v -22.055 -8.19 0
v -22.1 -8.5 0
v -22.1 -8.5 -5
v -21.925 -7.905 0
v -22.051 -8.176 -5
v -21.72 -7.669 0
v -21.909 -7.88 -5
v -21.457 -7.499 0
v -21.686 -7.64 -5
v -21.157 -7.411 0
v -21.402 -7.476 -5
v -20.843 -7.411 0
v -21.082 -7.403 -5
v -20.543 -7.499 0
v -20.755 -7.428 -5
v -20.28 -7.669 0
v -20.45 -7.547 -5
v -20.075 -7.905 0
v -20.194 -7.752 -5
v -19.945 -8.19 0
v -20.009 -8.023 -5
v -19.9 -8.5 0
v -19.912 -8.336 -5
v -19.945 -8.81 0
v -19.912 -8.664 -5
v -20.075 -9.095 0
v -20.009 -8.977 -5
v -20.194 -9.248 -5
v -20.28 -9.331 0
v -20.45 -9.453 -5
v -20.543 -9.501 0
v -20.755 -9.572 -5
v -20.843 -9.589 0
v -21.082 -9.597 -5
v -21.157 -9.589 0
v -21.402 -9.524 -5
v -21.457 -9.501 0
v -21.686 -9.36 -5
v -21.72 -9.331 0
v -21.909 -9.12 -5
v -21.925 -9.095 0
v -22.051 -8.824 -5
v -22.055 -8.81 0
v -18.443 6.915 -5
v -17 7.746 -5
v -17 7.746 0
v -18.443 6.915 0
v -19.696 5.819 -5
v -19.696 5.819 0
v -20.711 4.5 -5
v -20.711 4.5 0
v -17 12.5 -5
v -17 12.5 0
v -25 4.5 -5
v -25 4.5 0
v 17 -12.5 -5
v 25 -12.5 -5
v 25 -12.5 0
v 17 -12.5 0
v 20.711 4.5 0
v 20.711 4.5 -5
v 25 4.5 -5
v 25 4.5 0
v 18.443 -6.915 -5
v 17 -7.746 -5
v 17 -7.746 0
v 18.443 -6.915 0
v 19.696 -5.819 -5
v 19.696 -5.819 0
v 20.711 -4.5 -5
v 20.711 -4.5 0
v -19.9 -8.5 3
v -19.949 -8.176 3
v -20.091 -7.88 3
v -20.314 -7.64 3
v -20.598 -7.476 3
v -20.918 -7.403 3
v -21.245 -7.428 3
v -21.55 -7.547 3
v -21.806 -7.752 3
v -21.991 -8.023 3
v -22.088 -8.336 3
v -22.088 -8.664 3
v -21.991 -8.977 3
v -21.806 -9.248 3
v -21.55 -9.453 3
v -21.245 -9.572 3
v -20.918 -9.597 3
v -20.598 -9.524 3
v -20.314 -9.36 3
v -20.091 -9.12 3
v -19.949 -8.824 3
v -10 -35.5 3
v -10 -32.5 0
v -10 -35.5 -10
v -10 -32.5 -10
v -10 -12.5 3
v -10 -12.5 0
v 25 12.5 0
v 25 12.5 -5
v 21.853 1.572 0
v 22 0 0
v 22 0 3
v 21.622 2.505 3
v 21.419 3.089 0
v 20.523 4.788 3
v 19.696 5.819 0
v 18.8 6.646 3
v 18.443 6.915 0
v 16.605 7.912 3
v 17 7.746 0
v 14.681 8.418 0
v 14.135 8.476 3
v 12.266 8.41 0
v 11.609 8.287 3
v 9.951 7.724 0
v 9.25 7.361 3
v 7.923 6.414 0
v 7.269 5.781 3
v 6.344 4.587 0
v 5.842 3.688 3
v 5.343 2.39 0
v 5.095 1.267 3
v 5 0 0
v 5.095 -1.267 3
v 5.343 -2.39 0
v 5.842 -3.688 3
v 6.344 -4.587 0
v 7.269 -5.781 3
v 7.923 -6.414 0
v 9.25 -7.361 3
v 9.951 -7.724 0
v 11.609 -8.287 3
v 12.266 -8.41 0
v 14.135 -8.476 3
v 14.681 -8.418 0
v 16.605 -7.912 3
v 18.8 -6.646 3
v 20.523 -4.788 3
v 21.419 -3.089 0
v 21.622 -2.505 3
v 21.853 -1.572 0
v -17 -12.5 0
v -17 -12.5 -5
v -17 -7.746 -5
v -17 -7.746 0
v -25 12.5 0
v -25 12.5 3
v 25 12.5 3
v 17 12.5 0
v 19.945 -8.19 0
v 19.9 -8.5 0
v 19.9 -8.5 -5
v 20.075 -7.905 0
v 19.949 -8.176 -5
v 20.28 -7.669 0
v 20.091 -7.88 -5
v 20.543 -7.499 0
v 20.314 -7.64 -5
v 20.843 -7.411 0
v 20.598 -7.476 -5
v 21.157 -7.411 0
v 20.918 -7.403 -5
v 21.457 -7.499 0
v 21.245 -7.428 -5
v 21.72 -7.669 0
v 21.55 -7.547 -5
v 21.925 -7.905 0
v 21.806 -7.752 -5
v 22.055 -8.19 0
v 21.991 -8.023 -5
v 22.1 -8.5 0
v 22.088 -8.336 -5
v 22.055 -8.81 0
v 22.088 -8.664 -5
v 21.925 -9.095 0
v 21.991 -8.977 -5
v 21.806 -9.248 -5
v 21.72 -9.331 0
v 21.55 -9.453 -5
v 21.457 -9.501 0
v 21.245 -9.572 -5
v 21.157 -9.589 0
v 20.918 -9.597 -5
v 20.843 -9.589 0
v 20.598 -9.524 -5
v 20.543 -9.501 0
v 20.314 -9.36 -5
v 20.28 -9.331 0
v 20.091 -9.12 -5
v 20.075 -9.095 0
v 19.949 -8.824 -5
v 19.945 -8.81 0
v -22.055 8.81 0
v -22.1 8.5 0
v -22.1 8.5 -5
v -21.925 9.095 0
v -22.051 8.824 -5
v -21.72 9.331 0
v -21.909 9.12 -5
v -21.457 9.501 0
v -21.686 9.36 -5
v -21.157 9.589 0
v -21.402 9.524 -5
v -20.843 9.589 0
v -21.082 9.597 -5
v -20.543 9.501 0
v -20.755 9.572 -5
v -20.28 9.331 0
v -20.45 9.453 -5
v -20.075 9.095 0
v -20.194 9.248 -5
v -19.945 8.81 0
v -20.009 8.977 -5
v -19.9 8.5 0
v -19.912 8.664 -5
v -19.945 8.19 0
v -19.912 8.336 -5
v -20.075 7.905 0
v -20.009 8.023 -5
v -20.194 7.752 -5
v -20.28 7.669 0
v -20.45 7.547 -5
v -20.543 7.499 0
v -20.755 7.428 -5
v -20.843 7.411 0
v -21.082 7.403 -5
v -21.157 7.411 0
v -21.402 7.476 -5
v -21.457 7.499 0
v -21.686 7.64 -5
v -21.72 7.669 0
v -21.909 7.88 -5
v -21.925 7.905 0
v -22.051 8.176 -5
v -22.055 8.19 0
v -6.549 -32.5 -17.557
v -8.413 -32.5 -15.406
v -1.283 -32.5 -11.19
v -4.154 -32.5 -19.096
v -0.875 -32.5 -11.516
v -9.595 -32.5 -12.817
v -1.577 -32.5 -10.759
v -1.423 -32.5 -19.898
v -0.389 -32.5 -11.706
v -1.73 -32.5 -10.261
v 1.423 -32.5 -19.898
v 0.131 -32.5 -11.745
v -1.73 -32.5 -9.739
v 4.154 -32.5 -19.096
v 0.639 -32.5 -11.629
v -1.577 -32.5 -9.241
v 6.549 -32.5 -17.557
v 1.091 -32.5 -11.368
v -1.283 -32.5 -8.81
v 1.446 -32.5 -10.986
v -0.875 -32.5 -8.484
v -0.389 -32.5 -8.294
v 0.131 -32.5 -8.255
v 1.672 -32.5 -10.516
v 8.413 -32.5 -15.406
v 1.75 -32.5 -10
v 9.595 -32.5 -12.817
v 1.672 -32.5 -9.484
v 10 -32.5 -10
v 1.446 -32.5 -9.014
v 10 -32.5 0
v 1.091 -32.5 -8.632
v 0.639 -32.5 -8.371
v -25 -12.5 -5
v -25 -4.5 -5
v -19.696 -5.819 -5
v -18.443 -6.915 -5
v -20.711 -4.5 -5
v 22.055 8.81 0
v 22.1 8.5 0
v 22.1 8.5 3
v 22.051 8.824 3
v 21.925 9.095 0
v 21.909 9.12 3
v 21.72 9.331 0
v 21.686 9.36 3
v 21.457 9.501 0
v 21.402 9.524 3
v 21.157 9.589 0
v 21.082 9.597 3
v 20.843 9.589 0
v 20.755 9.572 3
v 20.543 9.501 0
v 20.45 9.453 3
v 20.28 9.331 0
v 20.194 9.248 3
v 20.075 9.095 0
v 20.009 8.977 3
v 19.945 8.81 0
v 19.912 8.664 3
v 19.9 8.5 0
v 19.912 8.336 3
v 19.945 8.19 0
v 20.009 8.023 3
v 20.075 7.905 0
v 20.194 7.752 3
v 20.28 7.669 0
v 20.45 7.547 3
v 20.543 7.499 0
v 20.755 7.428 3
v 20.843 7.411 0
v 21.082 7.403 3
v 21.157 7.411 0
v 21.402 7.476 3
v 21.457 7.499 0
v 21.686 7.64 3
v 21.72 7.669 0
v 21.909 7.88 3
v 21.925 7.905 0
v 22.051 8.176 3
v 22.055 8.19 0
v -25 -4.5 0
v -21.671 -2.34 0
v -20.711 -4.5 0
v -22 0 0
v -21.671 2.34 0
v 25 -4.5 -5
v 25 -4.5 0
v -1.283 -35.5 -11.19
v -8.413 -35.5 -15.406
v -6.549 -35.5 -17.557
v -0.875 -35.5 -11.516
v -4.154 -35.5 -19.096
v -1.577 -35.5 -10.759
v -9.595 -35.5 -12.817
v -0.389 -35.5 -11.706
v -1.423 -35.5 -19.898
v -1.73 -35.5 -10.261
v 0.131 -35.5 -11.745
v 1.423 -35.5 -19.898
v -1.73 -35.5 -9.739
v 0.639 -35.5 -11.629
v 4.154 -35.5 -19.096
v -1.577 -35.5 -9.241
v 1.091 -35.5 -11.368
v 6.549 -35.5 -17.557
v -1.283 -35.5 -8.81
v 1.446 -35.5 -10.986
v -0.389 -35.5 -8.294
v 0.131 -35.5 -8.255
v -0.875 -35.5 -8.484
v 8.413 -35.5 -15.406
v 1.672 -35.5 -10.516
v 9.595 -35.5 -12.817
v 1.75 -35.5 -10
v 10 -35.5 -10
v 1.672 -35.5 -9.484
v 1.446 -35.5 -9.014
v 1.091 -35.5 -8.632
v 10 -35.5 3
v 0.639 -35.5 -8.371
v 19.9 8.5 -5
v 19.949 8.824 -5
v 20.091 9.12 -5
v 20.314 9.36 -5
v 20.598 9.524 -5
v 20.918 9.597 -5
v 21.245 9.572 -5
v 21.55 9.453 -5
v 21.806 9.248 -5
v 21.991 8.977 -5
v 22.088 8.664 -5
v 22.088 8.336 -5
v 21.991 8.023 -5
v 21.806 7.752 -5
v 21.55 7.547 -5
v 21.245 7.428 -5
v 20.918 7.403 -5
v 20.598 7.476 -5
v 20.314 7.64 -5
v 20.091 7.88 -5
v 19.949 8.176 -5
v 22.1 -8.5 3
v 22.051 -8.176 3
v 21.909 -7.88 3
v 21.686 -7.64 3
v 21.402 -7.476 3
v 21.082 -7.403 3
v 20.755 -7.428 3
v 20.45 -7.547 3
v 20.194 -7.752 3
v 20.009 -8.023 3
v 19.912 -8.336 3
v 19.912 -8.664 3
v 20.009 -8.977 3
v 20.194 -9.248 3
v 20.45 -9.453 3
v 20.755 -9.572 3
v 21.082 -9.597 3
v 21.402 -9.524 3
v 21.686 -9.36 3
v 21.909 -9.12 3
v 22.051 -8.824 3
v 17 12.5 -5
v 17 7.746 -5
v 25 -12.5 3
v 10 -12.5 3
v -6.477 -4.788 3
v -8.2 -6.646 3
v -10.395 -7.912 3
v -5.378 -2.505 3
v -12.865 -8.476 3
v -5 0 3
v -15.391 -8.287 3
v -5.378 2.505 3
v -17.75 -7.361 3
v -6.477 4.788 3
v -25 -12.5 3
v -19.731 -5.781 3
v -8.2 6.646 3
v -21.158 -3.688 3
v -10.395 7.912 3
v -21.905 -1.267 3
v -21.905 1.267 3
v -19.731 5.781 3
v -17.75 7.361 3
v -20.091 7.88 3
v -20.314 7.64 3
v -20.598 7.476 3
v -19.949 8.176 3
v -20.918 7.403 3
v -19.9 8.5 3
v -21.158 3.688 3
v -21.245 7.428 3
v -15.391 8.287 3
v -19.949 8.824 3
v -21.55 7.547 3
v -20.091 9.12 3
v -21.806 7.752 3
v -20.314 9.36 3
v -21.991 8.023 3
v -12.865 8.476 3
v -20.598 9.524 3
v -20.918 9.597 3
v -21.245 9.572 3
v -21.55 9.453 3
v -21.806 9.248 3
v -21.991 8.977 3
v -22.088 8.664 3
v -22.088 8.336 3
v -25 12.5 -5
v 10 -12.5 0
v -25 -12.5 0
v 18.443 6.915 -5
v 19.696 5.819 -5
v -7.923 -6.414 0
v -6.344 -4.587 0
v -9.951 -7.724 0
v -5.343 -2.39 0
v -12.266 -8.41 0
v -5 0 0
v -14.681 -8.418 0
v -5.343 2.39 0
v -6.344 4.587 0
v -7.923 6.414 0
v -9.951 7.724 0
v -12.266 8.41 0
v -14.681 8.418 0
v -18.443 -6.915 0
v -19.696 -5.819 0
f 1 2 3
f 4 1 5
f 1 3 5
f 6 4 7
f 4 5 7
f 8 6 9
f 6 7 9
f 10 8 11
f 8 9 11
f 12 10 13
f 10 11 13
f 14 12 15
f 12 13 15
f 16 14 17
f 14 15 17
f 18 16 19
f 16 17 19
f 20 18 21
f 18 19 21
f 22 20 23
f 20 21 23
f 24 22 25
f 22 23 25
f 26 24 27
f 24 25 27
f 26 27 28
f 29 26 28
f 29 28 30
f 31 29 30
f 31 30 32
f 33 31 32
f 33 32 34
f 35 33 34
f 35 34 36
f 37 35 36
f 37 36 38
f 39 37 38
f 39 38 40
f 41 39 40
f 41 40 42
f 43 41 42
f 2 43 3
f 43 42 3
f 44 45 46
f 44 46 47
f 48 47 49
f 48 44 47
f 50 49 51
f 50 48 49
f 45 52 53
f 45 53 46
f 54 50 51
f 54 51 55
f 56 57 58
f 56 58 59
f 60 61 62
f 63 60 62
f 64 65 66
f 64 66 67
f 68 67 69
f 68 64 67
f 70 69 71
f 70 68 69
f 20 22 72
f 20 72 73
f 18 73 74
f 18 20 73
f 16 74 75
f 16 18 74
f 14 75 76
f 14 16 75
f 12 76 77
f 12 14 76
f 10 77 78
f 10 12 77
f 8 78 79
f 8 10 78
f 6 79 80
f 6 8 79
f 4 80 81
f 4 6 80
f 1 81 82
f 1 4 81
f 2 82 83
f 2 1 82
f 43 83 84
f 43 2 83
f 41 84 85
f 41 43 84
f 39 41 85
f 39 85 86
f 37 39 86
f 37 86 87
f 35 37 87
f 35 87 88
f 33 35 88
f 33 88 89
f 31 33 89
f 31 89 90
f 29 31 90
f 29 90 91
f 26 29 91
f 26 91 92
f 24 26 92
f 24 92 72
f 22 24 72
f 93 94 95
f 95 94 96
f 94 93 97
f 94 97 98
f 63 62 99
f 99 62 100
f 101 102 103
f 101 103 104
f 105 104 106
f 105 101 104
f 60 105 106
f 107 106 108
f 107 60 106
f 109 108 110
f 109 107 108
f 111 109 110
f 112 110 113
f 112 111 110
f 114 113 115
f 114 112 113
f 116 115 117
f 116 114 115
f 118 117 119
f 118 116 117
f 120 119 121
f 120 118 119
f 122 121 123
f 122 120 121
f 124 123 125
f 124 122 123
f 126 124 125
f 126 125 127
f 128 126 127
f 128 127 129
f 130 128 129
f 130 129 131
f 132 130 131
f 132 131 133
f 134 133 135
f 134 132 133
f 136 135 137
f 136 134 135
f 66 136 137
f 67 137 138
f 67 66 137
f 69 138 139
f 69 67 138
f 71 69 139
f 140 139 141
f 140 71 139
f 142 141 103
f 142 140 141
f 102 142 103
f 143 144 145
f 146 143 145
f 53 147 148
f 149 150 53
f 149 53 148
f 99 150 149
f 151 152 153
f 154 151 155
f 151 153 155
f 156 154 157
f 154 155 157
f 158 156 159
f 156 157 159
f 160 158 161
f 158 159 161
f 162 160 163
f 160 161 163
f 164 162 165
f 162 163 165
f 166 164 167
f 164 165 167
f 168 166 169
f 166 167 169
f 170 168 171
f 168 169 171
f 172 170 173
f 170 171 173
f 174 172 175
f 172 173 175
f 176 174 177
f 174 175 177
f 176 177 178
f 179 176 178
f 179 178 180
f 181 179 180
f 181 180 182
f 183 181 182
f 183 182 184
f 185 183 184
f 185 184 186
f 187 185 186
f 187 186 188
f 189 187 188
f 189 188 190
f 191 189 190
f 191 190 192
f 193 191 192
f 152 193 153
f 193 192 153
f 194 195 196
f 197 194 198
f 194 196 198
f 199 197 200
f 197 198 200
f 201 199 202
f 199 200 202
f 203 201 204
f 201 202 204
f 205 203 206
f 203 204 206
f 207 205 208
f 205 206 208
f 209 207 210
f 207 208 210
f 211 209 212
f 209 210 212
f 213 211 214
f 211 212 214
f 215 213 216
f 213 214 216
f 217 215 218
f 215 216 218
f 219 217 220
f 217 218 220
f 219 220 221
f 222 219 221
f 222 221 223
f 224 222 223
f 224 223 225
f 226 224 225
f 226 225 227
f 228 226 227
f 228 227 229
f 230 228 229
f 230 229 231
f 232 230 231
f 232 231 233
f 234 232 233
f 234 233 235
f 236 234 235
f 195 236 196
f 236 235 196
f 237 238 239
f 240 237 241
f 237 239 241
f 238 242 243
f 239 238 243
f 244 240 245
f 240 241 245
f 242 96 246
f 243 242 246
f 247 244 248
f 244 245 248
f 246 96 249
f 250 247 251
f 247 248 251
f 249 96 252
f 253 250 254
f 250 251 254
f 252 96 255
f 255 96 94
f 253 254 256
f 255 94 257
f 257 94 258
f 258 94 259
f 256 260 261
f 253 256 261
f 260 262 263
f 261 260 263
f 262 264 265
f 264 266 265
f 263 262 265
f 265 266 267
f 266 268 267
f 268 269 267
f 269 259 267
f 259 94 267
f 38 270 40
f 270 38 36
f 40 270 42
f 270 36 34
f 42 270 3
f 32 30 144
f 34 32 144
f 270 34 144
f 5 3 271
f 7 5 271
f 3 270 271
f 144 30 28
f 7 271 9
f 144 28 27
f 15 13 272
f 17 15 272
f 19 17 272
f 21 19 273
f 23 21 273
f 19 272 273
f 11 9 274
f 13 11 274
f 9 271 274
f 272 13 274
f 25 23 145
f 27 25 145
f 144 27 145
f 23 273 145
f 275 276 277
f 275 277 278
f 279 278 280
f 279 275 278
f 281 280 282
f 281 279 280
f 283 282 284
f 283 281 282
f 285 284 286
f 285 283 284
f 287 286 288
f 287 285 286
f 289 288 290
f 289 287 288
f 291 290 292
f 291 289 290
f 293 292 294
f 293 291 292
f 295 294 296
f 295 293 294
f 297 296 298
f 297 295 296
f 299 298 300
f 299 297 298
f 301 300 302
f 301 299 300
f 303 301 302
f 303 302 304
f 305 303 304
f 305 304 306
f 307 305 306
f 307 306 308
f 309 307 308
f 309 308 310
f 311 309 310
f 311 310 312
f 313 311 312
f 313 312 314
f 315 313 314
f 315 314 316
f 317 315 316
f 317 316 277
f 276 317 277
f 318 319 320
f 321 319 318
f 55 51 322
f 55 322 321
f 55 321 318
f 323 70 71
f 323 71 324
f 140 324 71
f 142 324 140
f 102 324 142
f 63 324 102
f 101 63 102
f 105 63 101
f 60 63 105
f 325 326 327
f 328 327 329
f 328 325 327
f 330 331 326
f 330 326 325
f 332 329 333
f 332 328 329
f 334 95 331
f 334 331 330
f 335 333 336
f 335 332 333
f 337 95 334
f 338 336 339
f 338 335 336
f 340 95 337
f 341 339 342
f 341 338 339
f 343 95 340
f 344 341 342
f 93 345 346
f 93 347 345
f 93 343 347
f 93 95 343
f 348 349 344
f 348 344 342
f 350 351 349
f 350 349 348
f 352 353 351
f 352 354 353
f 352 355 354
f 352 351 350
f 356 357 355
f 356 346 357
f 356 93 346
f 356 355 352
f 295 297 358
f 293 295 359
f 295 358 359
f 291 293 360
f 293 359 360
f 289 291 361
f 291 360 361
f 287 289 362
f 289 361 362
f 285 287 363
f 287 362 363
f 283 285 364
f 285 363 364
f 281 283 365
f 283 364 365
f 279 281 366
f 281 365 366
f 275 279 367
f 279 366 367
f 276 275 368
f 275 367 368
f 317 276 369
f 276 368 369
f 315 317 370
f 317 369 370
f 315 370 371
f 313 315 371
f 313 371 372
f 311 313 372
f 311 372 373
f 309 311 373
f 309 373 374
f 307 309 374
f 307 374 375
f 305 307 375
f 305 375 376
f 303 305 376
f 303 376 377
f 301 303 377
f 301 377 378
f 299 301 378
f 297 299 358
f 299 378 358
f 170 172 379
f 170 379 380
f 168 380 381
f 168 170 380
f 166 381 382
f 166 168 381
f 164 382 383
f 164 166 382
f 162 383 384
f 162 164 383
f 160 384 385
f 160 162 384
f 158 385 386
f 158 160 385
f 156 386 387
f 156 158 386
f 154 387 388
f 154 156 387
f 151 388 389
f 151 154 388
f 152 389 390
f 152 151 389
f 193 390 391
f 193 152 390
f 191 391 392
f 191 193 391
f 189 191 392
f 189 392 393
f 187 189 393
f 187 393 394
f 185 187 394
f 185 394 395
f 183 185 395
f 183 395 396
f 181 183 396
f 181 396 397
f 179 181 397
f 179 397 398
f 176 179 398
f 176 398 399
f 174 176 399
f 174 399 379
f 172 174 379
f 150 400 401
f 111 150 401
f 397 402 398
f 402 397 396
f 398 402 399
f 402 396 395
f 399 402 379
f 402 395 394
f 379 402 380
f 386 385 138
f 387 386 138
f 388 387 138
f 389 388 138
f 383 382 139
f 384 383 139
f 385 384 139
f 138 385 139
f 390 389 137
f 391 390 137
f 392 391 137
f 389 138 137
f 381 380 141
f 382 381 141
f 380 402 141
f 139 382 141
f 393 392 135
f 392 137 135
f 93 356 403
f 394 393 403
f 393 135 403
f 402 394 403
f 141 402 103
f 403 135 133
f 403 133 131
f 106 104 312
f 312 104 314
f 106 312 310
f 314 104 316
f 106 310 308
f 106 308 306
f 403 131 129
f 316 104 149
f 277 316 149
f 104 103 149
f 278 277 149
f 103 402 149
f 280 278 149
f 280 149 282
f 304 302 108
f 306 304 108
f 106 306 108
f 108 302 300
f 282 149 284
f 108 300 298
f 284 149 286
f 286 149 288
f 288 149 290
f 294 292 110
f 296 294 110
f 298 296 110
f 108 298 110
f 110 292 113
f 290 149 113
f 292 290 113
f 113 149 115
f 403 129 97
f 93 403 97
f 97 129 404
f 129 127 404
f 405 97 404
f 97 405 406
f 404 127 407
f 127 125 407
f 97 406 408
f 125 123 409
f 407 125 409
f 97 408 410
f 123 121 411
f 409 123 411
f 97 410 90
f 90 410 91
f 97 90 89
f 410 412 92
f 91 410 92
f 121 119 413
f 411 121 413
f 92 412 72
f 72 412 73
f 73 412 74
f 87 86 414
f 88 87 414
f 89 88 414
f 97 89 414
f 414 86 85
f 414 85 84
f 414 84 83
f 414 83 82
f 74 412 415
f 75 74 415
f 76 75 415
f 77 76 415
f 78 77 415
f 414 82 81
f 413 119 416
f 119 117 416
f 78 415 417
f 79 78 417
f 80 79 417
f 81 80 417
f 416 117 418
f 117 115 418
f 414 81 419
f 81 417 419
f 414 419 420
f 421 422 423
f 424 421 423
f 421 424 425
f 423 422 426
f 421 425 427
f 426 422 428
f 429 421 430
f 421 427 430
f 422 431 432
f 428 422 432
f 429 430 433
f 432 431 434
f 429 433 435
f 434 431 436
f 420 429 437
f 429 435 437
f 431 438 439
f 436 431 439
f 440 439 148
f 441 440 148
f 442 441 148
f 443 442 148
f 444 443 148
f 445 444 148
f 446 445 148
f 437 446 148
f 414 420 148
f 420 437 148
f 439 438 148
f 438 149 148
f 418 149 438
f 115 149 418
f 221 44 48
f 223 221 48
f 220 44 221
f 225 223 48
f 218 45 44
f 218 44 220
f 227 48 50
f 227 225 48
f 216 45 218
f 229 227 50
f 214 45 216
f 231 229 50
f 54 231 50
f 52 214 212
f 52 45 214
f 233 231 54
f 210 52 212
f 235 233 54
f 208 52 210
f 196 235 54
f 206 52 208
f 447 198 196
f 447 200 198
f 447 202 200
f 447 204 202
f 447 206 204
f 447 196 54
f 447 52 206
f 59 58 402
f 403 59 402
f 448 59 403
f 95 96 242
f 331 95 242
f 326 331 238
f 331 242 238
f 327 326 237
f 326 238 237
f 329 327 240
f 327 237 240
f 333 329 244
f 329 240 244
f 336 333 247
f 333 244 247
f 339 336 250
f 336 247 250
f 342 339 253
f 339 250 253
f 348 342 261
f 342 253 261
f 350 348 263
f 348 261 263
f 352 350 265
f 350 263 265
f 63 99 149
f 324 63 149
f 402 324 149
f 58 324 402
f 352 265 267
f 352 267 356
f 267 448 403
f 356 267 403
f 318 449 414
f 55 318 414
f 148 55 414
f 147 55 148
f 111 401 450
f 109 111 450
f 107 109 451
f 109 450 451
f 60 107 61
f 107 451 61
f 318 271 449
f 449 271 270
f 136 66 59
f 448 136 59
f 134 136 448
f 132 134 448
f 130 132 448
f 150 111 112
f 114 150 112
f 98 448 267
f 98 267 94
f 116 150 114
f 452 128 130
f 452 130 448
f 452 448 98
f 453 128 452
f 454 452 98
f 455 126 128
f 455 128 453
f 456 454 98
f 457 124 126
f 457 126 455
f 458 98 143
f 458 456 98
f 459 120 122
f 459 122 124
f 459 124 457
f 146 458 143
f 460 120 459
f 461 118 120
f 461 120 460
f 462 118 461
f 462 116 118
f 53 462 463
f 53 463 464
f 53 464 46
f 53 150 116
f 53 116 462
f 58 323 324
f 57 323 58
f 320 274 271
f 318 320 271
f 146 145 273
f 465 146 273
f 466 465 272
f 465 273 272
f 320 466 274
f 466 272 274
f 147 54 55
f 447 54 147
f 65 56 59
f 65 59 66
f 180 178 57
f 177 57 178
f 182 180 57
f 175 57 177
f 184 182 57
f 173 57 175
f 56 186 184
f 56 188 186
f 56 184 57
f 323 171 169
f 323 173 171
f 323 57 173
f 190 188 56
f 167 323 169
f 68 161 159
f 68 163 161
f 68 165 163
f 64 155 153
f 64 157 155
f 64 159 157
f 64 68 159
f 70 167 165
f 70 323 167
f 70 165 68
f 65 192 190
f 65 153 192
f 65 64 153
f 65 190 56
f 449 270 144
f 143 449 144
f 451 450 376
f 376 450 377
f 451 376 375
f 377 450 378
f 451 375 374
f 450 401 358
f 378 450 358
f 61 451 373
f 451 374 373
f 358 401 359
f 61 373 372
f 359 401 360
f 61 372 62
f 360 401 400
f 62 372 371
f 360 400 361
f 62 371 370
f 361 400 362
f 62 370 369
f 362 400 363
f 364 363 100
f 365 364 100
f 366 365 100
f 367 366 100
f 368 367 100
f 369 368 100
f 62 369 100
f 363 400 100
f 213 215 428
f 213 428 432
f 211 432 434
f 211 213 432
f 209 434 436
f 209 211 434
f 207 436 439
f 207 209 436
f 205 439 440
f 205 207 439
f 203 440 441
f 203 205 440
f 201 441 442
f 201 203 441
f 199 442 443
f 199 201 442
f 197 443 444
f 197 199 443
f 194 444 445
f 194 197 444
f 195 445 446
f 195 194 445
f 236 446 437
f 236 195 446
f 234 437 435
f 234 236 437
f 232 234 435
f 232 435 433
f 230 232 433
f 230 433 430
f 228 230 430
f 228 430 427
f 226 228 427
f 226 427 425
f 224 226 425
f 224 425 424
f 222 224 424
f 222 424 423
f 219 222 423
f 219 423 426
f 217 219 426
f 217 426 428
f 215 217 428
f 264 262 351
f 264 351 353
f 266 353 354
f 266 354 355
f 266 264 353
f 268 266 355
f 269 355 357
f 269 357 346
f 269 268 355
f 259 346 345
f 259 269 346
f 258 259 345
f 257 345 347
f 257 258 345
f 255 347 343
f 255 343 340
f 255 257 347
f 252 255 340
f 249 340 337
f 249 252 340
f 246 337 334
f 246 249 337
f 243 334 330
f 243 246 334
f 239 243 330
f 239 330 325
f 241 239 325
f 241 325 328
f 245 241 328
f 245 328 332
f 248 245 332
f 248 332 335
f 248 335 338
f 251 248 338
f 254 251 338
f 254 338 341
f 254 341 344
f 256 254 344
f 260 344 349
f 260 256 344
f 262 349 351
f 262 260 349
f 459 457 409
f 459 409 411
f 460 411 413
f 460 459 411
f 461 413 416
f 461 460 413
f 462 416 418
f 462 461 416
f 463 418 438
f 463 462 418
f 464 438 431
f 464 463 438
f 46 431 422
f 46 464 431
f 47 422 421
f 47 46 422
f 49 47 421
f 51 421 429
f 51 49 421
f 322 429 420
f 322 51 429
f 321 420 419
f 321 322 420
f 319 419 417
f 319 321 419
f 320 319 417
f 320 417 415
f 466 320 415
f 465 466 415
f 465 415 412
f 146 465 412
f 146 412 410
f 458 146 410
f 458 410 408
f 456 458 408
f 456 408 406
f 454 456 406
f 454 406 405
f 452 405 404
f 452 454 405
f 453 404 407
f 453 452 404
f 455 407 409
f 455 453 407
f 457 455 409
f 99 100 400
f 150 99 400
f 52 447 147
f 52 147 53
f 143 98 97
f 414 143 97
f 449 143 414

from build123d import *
from build123d.topology import SkipClean

# Parameters (mm, degrees)
SKETCH_1_R      = 8.5
SKETCH_1_R_2    = 1.1
EXTRUDE_1_DEPTH = 3
SKETCH_2_R      = 1.75
EXTRUDE_2_DEPTH = 3
EXTRUDE_START   = 5
SKETCH_5_R      = 1.1
EXTRUDE_3_DEPTH = 5


with BuildPart() as part:
    # 草图1 → 凸台-拉伸1 (new body)
    with BuildSketch(Plane.XY):
        Polygon((-25, 12.5), (25, 12.5), (25, -12.5), (10, -12.5), (10, -32.5), (-10, -32.5), (-10, -12.5), (-25, -12.5), align=None)
        with Locations((-13.5, 0)):
            Circle(SKETCH_1_R, mode=Mode.SUBTRACT)
        with Locations((13.5, 0)):
            Circle(SKETCH_1_R, mode=Mode.SUBTRACT)
        with Locations((-21, 8.5)):
            Circle(SKETCH_1_R_2, mode=Mode.SUBTRACT)
        with Locations((21, 8.5)):
            Circle(SKETCH_1_R_2, mode=Mode.SUBTRACT)
        with Locations((21, -8.5)):
            Circle(SKETCH_1_R_2, mode=Mode.SUBTRACT)
        with Locations((-21, -8.5)):
            Circle(SKETCH_1_R_2, mode=Mode.SUBTRACT)
    extrude(amount=EXTRUDE_1_DEPTH)

    # 草图2 → 凸台-拉伸2 (add)
    with BuildSketch(Plane.XZ.offset(32.5)):
        with BuildLine():
            Line((-10, 3), (-10, -10))
            ThreePointArc((-10, -10), (0, -20), (10, -10))
            Line((10, -10), (10, 3))
            Line((10, 3), (-10, 3))
        make_face()
        with Locations((0, -10)):
            Circle(SKETCH_2_R, mode=Mode.SUBTRACT)
    extrude(amount=EXTRUDE_2_DEPTH)

    # 草图5 → 凸台-拉伸3 (add)
    # profile 1 of 4: a face of its own
    with SkipClean():  # the faces are left unmerged after this step: merging them gives an invalid solid
        with BuildSketch(Plane(origin=(0, 0, 0), x_dir=(-1, 0, 0), z_dir=(0, 0, -1)).offset(EXTRUDE_START)):
            with BuildLine():
                Line((-25, 12.5), (-17, 12.5))
                Line((-17, 12.5), (-17, 7.745966692))
                ThreePointArc((-17, 7.745966692), (-19.096070443, 6.397968083), (-20.711102551, 4.5))
                Line((-20.711102551, 4.5), (-25, 4.5))
                Line((-25, 4.5), (-25, 12.5))
            make_face()
            with Locations((-21, 8.5)):
                Circle(SKETCH_5_R, mode=Mode.SUBTRACT)
        # profile 2 of 4: a face of its own
        with BuildSketch(Plane(origin=(0, 0, 0), x_dir=(-1, 0, 0), z_dir=(0, 0, -1)).offset(EXTRUDE_START)):
            with BuildLine():
                Line((-25, -12.5), (-17, -12.5))
                Line((-17, -12.5), (-17, -7.745966692))
                ThreePointArc((-17, -7.745966692), (-19.096070443, -6.397968083), (-20.711102551, -4.5))
                Line((-20.711102551, -4.5), (-25, -4.5))
                Line((-25, -4.5), (-25, -12.5))
            make_face()
            with Locations((-21, -8.5)):
                Circle(SKETCH_5_R, mode=Mode.SUBTRACT)
        # profile 3 of 4: a face of its own
        with BuildSketch(Plane(origin=(0, 0, 0), x_dir=(-1, 0, 0), z_dir=(0, 0, -1)).offset(EXTRUDE_START)):
            with BuildLine():
                Line((25, 12.5), (17, 12.5))
                Line((17, 12.5), (17, 7.745966692))
                ThreePointArc((17, 7.745966692), (19.096070443, 6.397968083), (20.711102551, 4.5))
                Line((20.711102551, 4.5), (25, 4.5))
                Line((25, 4.5), (25, 12.5))
            make_face()
            with Locations((21, 8.5)):
                Circle(SKETCH_5_R, mode=Mode.SUBTRACT)
        # profile 4 of 4: a face of its own
        with BuildSketch(Plane(origin=(0, 0, 0), x_dir=(-1, 0, 0), z_dir=(0, 0, -1)).offset(EXTRUDE_START)):
            with BuildLine():
                Line((25, -12.5), (17, -12.5))
                Line((17, -12.5), (17, -7.745966692))
                ThreePointArc((17, -7.745966692), (19.096070443, -6.397968083), (20.711102551, -4.5))
                Line((20.711102551, -4.5), (25, -4.5))
                Line((25, -4.5), (25, -12.5))
            make_face()
            with Locations((21, -8.5)):
                Circle(SKETCH_5_R, mode=Mode.SUBTRACT)
        extrude(amount=-EXTRUDE_3_DEPTH)


solid = part.part
